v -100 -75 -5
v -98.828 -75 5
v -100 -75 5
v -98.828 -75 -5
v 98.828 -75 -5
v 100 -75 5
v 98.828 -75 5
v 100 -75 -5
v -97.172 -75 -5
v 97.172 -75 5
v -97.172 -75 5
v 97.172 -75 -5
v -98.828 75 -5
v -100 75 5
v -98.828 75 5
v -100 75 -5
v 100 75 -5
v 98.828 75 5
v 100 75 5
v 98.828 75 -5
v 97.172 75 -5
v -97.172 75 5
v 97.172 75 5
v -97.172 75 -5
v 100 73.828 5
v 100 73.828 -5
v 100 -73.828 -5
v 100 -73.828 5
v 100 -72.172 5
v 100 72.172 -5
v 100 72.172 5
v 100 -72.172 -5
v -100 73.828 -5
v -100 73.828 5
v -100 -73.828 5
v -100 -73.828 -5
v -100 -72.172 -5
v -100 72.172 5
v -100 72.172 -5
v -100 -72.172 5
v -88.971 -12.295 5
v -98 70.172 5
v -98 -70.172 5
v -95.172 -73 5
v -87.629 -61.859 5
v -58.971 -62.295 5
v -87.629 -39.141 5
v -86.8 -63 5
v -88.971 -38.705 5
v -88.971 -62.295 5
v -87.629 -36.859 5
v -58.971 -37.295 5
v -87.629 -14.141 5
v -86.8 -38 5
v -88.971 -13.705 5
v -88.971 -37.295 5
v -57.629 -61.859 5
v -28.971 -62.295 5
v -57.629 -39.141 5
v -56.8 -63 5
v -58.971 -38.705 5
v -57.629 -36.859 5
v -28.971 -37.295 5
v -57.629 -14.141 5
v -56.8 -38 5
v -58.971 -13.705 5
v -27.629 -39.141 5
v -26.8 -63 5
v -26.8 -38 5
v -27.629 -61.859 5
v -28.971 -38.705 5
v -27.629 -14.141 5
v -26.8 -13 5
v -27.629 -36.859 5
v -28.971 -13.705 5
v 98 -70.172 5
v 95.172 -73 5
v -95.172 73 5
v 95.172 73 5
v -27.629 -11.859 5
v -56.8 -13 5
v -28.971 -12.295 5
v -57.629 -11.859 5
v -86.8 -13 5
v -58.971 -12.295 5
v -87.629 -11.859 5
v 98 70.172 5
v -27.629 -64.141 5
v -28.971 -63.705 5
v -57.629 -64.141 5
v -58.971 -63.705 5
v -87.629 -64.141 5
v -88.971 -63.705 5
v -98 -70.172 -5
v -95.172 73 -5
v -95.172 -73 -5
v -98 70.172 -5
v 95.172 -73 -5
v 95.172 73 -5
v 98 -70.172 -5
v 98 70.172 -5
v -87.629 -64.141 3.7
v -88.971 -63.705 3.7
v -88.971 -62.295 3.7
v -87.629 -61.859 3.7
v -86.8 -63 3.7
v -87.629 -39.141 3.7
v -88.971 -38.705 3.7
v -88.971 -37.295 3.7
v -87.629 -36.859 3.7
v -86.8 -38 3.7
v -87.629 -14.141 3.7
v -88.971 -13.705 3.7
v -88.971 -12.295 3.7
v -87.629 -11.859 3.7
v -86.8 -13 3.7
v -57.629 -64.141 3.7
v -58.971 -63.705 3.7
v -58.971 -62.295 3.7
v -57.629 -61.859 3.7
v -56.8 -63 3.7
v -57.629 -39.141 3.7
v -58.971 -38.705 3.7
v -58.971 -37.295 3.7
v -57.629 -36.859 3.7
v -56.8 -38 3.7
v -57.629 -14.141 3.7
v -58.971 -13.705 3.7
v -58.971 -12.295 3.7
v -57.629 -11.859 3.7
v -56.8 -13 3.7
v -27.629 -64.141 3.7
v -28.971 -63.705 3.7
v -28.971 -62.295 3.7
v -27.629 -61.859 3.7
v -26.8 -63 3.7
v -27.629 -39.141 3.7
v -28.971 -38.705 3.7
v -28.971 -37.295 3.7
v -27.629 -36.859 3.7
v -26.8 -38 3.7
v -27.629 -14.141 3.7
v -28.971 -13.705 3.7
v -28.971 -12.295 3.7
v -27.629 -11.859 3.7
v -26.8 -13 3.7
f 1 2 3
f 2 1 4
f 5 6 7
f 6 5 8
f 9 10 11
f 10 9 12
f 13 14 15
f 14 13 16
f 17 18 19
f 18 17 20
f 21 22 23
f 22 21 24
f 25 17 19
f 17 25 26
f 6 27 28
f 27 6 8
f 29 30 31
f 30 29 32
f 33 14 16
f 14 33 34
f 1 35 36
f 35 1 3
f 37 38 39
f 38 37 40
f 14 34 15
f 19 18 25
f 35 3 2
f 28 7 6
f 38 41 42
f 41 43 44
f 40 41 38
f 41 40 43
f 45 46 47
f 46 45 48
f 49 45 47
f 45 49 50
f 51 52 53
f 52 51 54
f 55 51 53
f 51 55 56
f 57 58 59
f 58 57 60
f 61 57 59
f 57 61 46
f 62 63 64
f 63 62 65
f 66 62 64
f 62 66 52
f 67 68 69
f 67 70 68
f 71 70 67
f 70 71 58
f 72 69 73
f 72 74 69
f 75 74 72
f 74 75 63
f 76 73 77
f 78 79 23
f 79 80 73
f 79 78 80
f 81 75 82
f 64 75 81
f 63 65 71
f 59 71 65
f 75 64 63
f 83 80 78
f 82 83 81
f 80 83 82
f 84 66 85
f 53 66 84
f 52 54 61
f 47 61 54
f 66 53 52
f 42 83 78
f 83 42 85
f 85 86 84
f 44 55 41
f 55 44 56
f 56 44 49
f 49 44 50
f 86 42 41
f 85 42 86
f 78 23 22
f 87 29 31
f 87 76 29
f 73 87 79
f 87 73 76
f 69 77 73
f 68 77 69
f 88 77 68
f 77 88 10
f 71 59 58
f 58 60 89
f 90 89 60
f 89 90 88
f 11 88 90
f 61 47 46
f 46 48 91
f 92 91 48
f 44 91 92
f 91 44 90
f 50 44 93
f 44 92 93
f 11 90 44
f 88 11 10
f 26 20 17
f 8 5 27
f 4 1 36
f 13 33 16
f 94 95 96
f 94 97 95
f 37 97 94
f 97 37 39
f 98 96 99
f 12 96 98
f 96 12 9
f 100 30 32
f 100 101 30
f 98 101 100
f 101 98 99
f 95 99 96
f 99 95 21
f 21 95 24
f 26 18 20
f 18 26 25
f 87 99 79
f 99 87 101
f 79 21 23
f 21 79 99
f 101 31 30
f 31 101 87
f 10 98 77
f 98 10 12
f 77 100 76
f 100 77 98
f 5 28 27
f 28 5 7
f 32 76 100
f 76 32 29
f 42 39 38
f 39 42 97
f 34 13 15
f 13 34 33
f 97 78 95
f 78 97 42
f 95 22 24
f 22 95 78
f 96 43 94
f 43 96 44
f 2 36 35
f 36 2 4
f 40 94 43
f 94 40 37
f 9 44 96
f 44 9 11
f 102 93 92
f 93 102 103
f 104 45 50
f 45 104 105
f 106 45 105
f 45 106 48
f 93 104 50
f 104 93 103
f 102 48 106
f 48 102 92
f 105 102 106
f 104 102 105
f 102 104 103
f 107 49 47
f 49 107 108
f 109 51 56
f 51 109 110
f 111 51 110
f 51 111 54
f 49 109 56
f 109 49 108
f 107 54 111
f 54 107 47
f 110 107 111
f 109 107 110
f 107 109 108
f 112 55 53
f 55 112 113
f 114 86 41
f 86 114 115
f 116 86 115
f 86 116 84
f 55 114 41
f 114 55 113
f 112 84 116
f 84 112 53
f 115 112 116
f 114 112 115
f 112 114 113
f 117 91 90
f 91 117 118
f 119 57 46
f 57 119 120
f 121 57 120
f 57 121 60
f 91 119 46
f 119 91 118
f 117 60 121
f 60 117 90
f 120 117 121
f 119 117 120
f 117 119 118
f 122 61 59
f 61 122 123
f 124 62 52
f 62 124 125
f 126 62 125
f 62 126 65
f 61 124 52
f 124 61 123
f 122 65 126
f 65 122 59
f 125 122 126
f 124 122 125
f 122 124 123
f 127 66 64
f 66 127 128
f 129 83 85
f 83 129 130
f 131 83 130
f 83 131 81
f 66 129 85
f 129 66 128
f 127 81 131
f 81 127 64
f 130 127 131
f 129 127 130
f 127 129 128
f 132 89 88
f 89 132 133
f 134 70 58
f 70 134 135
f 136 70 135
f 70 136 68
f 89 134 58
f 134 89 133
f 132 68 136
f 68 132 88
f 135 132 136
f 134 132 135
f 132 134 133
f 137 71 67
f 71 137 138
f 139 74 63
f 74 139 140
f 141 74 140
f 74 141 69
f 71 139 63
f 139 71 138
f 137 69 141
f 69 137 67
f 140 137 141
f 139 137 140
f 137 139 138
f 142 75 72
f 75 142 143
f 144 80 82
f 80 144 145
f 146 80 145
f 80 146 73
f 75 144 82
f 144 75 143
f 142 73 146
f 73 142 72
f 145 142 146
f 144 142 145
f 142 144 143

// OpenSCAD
// Parameters
sheet_length = 200; //[100:400:1]
sheet_width = 150; //[75:300:1]
sheet_thickness = 10; //[5:20:1]
edge_radius = 2; //[1:6:0.5]
corner_chamfer = 4; //[2:10:1]
pore_radius = 1.2; //[0.6:2.5:0.1]
pore_depth = 0.8; //[0.3:2:0.1]
pore_margin = 12; //[6:30:1]
pore_spacing_x = 30; //[15:60:1]
pore_spacing_y = 25; //[15:60:1]
overlap = 1; //[0.5:2:0.1]

// Foam Sheet Body
module foam_sheet_body() {
  color([0.85, 0.85, 0.8])
  translate([0, 0, 0])
    cube([sheet_length, sheet_width, sheet_thickness], center=true);
}

// Edge Rounding
module edge_rounding() {
  union() {
    translate([sheet_length/2 - edge_radius, 0, 0])
      rotate([90, 0, 0])
        cylinder(r=edge_radius, h=sheet_width, center=true);
    translate([-sheet_length/2 + edge_radius, 0, 0])
      rotate([90, 0, 0])
        cylinder(r=edge_radius, h=sheet_width, center=true);
    translate([0, sheet_width/2 - edge_radius, 0])
      rotate([0, 90, 0])
        cylinder(r=edge_radius, h=sheet_length, center=true);
    translate([0, -sheet_width/2 + edge_radius, 0])
      rotate([0, 90, 0])
        cylinder(r=edge_radius, h=sheet_length, center=true);
    translate([sheet_length/2 - edge_radius, sheet_width/2 - edge_radius, 0])
      cylinder(r=edge_radius, h=sheet_thickness, center=true);
    translate([sheet_length/2 - edge_radius, -sheet_width/2 + edge_radius, 0])
      cylinder(r=edge_radius, h=sheet_thickness, center=true);
    translate([-sheet_length/2 + edge_radius, sheet_width/2 - edge_radius, 0])
      cylinder(r=edge_radius, h=sheet_thickness, center=true);
    translate([-sheet_length/2 + edge_radius, -sheet_width/2 + edge_radius, 0])
      cylinder(r=edge_radius, h=sheet_thickness, center=true);
  }
}

// Corner Chamfers
module corner_chamfers() {
  union() {
    translate([sheet_length/2 - corner_chamfer/2, sheet_width/2 - corner_chamfer/2, 0])
      rotate([0, 0, 45])
        cube([corner_chamfer, corner_chamfer, sheet_thickness + 2*overlap], center=true);
    translate([sheet_length/2 - corner_chamfer/2, -sheet_width/2 + corner_chamfer/2, 0])
      rotate([0, 0, 45])
        cube([corner_chamfer, corner_chamfer, sheet_thickness + 2*overlap], center=true);
    translate([-sheet_length/2 + corner_chamfer/2, sheet_width/2 - corner_chamfer/2, 0])
      rotate([0, 0, 45])
        cube([corner_chamfer, corner_chamfer, sheet_thickness + 2*overlap], center=true);
    translate([-sheet_length/2 + corner_chamfer/2, -sheet_width/2 + corner_chamfer/2, 0])
      rotate([0, 0, 45])
        cube([corner_chamfer, corner_chamfer, sheet_thickness + 2*overlap], center=true);
  }
}

// Surface Texture Pores
module surface_texture_pores() {
  union() {
    for (x = [0:2]) {
      for (y = [0:2]) {
        translate([-sheet_length/2 + pore_margin + x*pore_spacing_x, -sheet_width/2 + pore_margin + y*pore_spacing_y, sheet_thickness/2 - pore_depth/2])
          cylinder(r=pore_radius, h=pore_depth + overlap, center=true);
      }
    }
  }
}

// Complete Model
module complete_model() {
  difference() {
    union() {
      foam_sheet_body();
      edge_rounding();
    }
    corner_chamfers();
    surface_texture_pores();
  }
}

// Render the complete model
complete_model();
